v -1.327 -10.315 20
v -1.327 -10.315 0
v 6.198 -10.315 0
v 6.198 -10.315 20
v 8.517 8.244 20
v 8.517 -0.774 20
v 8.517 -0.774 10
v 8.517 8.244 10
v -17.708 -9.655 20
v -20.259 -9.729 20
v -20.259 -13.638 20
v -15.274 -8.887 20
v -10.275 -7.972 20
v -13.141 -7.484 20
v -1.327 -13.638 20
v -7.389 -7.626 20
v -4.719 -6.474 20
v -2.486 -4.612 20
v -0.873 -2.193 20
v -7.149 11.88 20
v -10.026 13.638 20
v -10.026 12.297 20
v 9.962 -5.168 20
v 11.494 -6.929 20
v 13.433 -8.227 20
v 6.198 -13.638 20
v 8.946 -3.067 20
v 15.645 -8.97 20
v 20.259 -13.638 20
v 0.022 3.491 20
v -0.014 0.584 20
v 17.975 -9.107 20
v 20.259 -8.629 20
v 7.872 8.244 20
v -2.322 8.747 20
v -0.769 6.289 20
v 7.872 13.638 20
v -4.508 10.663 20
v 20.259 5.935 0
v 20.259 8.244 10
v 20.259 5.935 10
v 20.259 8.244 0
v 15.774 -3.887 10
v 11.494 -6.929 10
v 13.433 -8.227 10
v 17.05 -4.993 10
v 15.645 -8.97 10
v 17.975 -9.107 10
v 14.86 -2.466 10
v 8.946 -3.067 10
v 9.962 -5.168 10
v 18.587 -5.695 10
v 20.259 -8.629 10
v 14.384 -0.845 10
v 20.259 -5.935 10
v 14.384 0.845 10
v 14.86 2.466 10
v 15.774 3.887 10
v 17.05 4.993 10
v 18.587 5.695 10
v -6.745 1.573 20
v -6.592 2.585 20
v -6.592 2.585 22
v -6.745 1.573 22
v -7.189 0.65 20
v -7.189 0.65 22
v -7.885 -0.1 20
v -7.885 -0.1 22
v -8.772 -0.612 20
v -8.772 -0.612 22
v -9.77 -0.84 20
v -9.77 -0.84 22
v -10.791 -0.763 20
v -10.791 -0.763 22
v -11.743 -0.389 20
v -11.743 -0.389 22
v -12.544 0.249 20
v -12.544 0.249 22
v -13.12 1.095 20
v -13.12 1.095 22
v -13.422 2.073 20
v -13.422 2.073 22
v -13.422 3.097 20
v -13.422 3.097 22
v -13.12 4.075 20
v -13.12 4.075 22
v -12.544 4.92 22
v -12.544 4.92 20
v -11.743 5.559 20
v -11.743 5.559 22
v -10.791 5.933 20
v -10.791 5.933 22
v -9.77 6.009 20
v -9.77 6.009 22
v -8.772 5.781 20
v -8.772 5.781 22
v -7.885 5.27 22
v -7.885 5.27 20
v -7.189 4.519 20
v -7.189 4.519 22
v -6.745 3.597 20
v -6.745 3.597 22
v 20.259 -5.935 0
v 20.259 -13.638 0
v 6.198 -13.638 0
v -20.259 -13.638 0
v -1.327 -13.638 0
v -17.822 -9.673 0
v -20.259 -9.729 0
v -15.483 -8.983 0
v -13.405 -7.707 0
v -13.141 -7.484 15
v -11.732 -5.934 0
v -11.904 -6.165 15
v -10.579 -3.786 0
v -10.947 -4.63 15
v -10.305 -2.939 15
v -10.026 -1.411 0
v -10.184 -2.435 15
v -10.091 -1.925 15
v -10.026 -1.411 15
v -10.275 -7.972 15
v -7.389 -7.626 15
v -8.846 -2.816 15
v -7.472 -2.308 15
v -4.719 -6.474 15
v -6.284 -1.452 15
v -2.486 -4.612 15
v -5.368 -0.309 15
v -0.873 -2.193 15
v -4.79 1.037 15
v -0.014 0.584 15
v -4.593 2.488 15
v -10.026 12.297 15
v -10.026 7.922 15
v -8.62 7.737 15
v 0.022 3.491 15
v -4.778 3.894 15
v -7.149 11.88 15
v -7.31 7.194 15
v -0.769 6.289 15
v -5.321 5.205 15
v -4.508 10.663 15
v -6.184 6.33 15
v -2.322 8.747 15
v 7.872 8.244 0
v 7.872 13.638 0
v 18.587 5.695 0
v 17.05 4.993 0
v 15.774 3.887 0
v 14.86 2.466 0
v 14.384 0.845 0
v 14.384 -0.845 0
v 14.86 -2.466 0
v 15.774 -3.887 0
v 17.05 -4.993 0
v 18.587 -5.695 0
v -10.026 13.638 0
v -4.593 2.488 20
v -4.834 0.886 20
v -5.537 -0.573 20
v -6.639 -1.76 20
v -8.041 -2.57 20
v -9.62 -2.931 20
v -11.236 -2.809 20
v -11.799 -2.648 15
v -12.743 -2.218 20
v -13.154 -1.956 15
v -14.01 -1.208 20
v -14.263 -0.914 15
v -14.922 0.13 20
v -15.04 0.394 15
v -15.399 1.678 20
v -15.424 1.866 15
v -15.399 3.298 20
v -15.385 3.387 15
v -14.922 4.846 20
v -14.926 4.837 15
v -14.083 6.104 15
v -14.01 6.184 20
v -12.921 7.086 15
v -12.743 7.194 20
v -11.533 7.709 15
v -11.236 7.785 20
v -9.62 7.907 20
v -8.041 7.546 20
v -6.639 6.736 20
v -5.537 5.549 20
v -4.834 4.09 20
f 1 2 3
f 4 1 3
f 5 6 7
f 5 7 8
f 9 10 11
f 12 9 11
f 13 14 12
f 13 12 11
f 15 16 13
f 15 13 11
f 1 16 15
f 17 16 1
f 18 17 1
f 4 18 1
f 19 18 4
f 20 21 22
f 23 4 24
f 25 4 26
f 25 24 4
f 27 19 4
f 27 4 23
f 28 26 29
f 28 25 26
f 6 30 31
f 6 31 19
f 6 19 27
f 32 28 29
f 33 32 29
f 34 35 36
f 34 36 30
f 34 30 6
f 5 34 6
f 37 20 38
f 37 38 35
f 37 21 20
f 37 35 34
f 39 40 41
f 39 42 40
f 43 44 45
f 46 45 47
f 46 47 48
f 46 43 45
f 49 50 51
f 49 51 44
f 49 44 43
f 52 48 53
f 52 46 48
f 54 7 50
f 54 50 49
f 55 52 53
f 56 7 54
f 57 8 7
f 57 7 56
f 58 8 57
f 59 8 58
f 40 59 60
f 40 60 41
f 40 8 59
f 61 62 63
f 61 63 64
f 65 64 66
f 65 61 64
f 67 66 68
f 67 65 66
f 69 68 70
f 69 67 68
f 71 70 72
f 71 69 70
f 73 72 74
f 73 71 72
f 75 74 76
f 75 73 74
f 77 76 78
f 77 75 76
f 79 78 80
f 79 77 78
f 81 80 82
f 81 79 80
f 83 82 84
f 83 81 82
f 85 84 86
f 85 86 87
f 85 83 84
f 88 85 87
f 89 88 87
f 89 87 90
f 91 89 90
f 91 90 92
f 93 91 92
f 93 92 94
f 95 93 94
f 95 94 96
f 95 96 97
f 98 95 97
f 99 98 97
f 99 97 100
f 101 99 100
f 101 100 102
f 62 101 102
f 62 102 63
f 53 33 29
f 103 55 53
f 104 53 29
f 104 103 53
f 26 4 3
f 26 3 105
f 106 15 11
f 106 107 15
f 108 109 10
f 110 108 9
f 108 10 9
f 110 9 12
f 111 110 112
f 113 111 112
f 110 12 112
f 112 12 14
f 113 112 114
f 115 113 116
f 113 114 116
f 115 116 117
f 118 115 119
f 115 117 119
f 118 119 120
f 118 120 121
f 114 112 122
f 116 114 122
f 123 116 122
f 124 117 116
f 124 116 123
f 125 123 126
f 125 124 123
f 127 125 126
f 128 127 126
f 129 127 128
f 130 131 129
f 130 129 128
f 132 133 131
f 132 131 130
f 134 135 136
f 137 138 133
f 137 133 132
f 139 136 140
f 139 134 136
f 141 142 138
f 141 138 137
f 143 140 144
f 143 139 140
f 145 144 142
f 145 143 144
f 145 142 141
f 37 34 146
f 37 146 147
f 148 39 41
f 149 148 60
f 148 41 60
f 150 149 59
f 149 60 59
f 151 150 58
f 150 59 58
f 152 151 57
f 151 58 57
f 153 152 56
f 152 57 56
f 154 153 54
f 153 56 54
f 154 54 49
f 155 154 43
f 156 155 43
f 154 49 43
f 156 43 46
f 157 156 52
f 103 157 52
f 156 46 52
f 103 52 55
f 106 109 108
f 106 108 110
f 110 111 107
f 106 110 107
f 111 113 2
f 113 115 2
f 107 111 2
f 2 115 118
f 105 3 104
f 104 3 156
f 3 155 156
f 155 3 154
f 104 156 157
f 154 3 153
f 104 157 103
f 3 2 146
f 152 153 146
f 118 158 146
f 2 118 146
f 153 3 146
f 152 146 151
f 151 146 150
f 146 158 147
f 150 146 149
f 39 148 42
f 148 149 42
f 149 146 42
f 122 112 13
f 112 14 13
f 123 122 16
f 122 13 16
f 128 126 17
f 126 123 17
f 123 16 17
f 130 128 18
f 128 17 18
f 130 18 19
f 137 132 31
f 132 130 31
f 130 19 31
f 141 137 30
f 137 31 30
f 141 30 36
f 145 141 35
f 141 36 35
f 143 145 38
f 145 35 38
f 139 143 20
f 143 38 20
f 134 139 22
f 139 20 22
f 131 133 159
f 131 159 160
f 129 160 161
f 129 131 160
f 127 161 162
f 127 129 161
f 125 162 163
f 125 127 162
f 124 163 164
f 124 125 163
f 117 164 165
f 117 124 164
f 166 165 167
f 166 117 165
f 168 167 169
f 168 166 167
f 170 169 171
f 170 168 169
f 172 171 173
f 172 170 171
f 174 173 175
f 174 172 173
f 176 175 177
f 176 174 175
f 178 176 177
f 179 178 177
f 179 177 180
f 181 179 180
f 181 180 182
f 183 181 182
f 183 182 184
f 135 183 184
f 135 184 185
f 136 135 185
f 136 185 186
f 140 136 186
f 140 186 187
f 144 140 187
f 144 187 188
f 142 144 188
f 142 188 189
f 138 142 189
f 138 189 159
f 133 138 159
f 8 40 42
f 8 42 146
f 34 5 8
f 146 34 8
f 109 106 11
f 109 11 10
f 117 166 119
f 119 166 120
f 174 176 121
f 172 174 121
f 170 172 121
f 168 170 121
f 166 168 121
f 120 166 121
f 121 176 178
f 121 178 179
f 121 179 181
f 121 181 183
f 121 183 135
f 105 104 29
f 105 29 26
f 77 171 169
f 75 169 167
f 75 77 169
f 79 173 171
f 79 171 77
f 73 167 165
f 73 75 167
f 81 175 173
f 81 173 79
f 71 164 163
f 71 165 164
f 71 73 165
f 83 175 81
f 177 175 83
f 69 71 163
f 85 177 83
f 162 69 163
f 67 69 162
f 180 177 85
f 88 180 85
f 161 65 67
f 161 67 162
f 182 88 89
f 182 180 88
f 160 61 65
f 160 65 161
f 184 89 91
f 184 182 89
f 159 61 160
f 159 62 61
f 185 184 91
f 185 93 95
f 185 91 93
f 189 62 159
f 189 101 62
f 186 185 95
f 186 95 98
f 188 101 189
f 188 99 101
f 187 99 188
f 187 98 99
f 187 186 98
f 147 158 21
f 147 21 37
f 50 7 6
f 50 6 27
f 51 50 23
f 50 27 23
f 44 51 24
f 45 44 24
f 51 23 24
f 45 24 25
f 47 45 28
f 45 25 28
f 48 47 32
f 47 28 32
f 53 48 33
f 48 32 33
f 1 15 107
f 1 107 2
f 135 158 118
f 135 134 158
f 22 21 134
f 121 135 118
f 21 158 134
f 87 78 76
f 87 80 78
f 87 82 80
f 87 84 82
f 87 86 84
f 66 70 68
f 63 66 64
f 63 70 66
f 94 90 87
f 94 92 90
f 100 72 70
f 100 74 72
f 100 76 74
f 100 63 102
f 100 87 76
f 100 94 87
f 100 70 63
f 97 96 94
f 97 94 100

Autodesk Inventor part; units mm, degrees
ref_plane "YZ Plane" through (0, 0, 0) normal (1, 0, 0) x (0, 1, 0)
ref_plane "XZ Plane" through (0, 0, 0) normal (0, 1, 0) x (-1, 0, 0)
ref_plane "XY Plane" through (0, 0, 0) normal (0, 0, 1) x (1, 0, 0)
sketch "스케치1" plane through (0, 0, 0) normal (0, 0, 1) x (1, 0, 0)
  line L0 (20.2592, -13.6377) -> (-20.2592, -13.6377)
  line L1 (-20.2592, -13.6377) -> (-20.2592, 13.6377)
  line L2 (-20.2592, 13.6377) -> (20.2592, 13.6377)
  line L3 (20.2592, 13.6377) -> (20.2592, -13.6377)
  line L4 (20.2592, -13.6377) -> (-20.2592, 13.6377) construction
  line L5 (-20.2592, -13.6377) -> (20.2592, 13.6377) construction
  point P0 (0, 0)
extrude "돌출1" add sketch "스케치1" along normal blind 20
sketch "스케치2" plane through (0, 0, 20) normal (0, 0, 1) x (1, 0, 0)
  line L0 (20.2592, 13.6377) -> (-20.2592, 13.6377) projected
  line L1 (-10.0264, 13.6377) -> (-10.0264, -1.4111)
  line L2 (-20.2592, 13.6377) -> (-20.2592, -13.6377) projected
  arc A0 (-20.2592, -9.7293) -> (-10.0264, -1.4111) centre (-19.2526, -0.5144) ccw
  line L3 (-10.0264, 13.6377) -> (-20.2592, 13.6377)
  line L4 (-20.2592, -9.7293) -> (-20.2592, 13.6377)
  line L5 (7.8725, 13.6377) -> (20.2592, 13.6377)
  line L6 (20.2592, 13.6377) -> (20.2592, 8.2439)
  line L7 (20.2592, 8.2439) -> (7.8725, 8.2439)
  line L8 (7.8725, 8.2439) -> (7.8725, 13.6377)
  point P0 (0, 0)
extrude "돌출2" cut sketch "스케치2" against normal blind 20
sketch "스케치3" plane through (0, 0, 20) normal (0, 0, 1) x (1, 0, 0)
  line L0 (-10.0264, -1.4111) -> (-10.0264, 13.6377) projected
  circle A0 centre (-10.0264, 2.161) radius 10.136
  line L1 (20.2592, 8.2439) -> (20.2592, -13.6377) projected
  line L2 (20.2592, 7.0816) -> (20.2592, -8.6286)
  line L3 (8.5169, 7.0816) -> (8.5169, -0.7735)
  arc A1 (8.5169, -0.7735) -> (20.2592, -8.6286) centre (17.3236, -0.3127) ccw
  line L4 (8.5169, 7.0816) -> (8.5169, 8.2439)
  line L5 (8.5169, 8.2439) -> (20.2592, 8.2439)
  point P0 (0, 0)
extrude "돌출3" cut sketch "스케치3" against normal blind 5 contours A0
extrude "돌출4" cut sketch "스케치3" against normal blind 10 contours L1 A1 L3 L4 L5
sketch "스케치4" plane through (0, 0, 15) normal (0, 0, 1) x (1, 0, 0)
  line L0 (-10.0264, -1.4111) -> (-10.0264, 12.2971) projected
  circle A0 centre (-10.0264, 2.488) radius 5.4337
  point P0 (0, 0)
extrude "돌출5" add sketch "스케치4" along normal blind 5
sketch "스케치5" plane through (-10.0264, 2.488, 20) normal (0, 0, 1) x (1, 0, 0)
  line L0 (0, -3.8991) -> (0, 5.4337) projected
  circle A0 centre (0, 0.0967) radius 3.434
  point P0 (10.0264, -2.488)
extrude "돌출6" add sketch "스케치5" along normal blind 2
sketch "스케치6" plane through (0, 0, 10) normal (0, 0, 1) x (1, 0, 0)
  line L0 (20.2592, 8.2439) -> (20.2592, -13.6377) projected
  circle A0 centre (20.2592, 0) radius 5.9354
  point P0 (0, 0)
extrude "돌출7" cut sketch "스케치6" against normal blind 20
sketch "스케치7" plane through (0, 0, 20) normal (0, 0, 1) x (1, 0, 0)
  line L0 (20.2592, -13.6377) -> (-20.2592, -13.6377) projected
  line L1 (-1.3274, -10.3147) -> (6.1983, -10.3147)
  line L2 (6.1983, -10.3147) -> (6.1983, -13.6377)
  line L3 (6.1983, -13.6377) -> (-1.3274, -13.6377)
  line L4 (-1.3274, -13.6377) -> (-1.3274, -10.3147)
  point P0 (0, 0)
extrude "돌출8" cut sketch "스케치7" against normal blind 20
properties part number "240626_part1"
